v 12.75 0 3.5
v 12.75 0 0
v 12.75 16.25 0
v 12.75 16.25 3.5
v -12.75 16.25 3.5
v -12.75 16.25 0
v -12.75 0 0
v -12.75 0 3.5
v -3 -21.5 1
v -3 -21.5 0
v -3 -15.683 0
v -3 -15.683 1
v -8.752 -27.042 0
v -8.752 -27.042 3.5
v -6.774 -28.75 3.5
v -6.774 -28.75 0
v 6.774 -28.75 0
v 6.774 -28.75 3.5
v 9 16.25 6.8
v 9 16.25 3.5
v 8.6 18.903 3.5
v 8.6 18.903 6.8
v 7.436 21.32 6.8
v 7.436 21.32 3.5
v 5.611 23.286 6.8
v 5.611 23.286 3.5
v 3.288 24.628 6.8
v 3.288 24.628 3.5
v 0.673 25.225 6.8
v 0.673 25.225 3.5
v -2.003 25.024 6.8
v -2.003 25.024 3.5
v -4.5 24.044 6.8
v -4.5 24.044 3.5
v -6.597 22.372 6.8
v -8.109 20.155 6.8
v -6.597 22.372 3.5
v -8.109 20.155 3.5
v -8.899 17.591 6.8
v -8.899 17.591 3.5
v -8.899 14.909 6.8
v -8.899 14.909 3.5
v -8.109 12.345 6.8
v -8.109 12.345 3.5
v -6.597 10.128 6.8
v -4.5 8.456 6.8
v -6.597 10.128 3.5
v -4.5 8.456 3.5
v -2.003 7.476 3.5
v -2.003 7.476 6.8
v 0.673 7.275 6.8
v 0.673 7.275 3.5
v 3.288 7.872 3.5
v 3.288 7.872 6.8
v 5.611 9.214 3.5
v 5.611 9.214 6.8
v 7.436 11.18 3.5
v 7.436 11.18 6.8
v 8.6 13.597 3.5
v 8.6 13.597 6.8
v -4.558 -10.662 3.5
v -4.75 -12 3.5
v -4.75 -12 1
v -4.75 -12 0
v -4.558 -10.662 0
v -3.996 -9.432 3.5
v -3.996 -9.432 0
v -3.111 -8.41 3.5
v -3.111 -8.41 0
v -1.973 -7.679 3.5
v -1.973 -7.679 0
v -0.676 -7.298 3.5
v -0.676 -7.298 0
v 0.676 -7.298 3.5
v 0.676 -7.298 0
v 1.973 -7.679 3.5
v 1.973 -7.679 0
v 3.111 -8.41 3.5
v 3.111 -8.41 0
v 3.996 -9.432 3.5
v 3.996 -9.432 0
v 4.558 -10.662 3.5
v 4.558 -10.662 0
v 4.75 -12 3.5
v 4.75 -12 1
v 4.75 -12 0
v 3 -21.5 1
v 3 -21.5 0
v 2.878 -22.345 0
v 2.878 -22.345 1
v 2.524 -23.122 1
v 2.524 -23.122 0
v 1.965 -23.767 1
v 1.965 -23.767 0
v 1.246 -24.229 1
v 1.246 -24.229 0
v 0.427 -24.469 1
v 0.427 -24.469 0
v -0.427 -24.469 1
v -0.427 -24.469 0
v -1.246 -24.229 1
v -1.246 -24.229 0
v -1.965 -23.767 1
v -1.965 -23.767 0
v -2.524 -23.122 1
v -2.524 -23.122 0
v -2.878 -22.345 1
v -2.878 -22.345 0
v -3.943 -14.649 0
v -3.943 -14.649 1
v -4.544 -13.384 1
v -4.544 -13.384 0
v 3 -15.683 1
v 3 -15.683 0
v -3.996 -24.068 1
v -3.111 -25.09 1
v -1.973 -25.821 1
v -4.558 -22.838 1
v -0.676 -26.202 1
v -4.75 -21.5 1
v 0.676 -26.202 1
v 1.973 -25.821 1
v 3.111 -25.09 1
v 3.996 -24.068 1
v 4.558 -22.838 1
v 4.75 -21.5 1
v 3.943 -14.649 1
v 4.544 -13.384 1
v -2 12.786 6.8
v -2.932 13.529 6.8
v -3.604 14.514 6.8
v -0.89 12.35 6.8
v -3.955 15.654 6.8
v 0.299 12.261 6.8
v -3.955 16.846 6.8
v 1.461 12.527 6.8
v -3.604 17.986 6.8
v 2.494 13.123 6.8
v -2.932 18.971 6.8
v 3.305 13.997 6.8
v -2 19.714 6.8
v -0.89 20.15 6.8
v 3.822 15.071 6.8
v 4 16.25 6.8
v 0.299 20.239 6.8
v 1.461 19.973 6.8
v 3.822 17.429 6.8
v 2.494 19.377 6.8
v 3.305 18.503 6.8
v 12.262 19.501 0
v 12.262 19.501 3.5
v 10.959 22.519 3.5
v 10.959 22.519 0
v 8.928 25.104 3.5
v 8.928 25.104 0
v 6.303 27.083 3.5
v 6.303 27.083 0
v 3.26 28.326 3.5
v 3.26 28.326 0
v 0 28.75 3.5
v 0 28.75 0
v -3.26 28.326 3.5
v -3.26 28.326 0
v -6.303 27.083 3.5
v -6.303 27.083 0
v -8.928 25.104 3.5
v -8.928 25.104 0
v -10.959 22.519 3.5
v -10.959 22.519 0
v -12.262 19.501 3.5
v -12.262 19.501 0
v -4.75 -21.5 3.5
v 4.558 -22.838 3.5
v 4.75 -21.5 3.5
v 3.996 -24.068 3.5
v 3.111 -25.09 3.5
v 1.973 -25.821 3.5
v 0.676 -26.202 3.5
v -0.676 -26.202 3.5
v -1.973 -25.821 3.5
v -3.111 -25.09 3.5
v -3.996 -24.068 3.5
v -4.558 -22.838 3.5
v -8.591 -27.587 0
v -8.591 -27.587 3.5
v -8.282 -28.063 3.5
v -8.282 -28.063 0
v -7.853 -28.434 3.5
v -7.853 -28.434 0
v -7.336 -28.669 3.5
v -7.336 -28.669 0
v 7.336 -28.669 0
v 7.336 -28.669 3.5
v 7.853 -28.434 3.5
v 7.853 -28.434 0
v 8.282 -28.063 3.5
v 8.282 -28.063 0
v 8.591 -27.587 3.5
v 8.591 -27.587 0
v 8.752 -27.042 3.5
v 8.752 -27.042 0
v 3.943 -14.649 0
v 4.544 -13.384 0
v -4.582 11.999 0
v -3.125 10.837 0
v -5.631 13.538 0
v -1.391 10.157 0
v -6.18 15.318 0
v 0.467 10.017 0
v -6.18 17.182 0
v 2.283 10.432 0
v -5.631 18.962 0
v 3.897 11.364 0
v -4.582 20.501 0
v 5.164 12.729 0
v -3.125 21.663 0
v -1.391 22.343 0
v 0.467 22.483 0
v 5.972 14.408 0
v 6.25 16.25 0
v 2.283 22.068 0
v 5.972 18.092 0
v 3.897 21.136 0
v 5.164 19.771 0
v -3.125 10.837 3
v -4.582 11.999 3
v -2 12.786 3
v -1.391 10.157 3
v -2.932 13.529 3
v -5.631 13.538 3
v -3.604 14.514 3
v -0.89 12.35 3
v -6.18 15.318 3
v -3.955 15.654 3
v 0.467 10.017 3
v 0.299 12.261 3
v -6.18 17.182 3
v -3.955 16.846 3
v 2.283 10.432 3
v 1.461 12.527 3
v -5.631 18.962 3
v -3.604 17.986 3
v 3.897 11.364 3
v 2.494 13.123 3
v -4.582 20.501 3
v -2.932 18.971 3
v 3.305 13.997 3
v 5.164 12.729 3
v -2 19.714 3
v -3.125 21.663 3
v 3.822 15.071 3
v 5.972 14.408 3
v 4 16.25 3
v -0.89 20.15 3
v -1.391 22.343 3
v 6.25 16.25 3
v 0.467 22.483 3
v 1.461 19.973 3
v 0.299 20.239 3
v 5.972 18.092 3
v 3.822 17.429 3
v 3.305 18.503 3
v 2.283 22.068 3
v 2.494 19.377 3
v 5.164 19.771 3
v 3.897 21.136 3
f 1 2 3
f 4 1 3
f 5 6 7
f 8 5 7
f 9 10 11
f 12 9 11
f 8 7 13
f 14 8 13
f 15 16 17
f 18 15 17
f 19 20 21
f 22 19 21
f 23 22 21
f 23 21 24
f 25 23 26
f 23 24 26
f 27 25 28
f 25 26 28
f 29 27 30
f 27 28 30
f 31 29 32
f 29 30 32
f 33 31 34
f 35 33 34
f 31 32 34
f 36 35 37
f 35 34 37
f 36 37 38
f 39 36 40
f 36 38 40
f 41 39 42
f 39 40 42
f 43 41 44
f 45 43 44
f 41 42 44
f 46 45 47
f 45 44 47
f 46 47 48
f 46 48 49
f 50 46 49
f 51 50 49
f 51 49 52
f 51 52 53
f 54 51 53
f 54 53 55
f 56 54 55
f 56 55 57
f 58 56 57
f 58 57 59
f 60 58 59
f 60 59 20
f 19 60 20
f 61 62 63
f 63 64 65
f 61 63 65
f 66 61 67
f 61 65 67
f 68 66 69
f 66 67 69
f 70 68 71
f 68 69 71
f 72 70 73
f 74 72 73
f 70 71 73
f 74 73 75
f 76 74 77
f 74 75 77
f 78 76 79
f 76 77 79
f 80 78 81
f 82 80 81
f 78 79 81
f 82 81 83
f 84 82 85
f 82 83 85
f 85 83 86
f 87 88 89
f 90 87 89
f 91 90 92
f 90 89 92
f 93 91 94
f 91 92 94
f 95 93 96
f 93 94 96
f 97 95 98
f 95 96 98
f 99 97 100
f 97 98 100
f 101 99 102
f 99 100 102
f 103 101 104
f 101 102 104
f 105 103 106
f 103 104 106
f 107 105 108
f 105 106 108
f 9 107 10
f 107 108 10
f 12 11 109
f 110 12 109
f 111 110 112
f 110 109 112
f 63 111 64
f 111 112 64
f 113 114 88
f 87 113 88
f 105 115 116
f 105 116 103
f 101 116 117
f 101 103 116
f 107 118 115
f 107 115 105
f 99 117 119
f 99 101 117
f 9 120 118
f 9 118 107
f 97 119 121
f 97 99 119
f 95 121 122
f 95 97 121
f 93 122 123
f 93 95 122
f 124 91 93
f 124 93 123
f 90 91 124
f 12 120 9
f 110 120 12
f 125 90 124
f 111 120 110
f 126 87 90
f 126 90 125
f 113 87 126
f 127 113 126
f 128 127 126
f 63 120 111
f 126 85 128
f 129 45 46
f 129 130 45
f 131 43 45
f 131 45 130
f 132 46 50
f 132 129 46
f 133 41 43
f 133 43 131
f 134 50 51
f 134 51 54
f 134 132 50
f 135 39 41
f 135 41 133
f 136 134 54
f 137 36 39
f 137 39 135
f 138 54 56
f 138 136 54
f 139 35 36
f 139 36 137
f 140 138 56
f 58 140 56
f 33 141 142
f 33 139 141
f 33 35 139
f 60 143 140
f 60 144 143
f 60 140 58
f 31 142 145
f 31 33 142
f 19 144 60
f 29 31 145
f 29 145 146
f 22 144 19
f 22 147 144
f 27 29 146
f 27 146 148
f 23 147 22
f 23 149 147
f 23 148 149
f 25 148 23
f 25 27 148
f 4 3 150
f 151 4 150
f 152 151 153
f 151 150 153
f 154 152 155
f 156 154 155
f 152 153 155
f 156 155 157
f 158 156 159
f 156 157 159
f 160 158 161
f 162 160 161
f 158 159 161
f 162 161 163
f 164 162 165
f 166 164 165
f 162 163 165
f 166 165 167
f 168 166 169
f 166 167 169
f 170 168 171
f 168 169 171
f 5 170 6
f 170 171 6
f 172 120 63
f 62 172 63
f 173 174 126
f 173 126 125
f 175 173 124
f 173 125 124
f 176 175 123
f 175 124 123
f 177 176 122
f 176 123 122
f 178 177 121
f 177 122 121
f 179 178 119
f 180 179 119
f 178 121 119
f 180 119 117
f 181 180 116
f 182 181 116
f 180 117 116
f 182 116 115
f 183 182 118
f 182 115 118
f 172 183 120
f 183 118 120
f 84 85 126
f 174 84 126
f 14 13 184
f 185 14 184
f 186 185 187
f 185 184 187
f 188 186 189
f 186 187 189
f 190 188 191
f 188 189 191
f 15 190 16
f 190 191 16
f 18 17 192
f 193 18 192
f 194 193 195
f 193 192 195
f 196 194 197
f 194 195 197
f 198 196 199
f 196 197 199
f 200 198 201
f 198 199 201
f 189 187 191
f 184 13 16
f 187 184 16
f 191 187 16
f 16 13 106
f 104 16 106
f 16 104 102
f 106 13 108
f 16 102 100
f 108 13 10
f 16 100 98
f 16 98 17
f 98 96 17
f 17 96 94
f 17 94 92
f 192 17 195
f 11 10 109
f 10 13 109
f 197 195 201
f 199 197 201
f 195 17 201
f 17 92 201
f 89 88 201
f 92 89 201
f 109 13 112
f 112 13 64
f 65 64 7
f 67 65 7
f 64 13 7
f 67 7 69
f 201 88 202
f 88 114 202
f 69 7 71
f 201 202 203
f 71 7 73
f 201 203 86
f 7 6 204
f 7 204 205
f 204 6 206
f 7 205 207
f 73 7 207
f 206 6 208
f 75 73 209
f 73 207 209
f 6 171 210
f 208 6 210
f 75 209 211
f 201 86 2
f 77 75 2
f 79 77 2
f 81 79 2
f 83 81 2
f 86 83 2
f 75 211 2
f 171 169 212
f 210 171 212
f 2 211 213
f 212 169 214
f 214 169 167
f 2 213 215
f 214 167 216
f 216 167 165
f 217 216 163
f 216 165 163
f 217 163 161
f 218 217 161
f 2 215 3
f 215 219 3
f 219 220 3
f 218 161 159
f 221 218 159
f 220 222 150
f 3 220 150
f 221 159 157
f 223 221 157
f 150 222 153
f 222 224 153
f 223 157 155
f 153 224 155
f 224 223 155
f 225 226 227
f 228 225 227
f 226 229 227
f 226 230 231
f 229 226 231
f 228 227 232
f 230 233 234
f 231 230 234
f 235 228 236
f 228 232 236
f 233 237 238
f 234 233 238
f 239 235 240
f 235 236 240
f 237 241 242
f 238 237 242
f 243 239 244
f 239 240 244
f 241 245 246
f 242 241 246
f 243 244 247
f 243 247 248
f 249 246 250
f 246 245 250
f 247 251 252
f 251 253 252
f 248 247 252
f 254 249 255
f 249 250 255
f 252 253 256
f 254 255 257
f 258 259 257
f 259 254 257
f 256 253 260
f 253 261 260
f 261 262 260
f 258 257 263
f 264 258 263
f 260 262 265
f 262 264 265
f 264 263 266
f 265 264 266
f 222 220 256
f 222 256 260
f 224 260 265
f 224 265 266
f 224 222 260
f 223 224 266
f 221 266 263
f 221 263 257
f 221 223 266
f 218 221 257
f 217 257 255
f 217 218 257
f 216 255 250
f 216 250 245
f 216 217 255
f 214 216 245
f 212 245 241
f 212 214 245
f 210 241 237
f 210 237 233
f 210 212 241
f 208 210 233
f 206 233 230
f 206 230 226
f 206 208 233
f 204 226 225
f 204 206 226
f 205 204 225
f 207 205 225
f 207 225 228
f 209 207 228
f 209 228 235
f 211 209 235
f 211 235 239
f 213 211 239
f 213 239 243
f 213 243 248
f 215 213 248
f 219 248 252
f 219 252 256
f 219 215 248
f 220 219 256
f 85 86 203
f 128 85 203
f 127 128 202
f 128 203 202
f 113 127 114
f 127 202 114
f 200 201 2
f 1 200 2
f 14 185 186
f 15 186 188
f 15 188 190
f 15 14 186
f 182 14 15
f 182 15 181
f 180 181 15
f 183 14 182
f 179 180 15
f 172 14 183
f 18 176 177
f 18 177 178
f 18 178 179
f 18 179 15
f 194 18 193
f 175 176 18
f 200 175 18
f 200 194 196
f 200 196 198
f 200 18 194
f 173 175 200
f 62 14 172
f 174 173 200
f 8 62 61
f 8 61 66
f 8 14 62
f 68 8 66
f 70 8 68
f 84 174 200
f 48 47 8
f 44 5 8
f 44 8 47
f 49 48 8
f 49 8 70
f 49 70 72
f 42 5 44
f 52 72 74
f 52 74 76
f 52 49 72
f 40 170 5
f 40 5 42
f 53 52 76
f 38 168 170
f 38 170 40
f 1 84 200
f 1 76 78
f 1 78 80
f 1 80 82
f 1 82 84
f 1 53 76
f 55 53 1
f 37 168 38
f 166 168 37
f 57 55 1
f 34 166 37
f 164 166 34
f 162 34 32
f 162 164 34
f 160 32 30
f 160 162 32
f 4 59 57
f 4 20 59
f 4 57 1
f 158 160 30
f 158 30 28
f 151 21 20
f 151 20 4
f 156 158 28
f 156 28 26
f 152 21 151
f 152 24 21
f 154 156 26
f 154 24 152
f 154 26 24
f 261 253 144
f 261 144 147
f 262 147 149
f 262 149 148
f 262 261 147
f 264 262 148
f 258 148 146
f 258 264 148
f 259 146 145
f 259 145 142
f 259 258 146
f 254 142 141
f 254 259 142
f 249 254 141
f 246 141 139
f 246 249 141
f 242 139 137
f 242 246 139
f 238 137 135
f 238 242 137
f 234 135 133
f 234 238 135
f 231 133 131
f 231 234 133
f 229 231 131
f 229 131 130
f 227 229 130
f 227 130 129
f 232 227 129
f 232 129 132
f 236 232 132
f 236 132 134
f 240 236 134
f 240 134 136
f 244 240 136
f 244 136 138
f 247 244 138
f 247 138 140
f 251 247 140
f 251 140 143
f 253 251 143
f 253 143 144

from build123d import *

# Parameters (mm, degrees)
F0_R     = 9
F1_DEPTH = 3.5
F2_DEPTH = 1
F0_R_2   = 6.25
F0_R_3   = 4
F3_DEPTH = 6.8
F4_DEPTH = 3


with BuildPart() as f1:
    # F0 (on Top) → F1 (new body)
    with BuildSketch(Plane.XY):
        with BuildLine():
            ThreePointArc((-8.752417, -27.042474), (-8.080641, -28.264092), (-6.773918, -28.75))
            Line((-6.773918, -28.75), (6.773918, -28.75))
            ThreePointArc((6.773918, -28.75), (8.080641, -28.264092), (8.752417, -27.042474))
            Line((8.752417, -27.042474), (12.75, 0))
            Line((12.75, 0), (12.75, 16.25))
            ThreePointArc((12.75, 16.25), (0, 28.75), (-12.75, 16.25))
            Line((-12.75, 16.25), (-12.75, 0))
            Line((-12.75, 0), (-8.752417, -27.042474))
        make_face()
        with BuildLine():
            Line((-4.75, -21.5), (-4.75, -12))
            ThreePointArc((-4.75, -12), (0, -7.25), (4.75, -12))
            Line((4.75, -12), (4.75, -21.5))
            ThreePointArc((4.75, -21.5), (0, -26.25), (-4.75, -21.5))
        make_face(mode=Mode.SUBTRACT)
        with Locations((0, 16.25)):
            Circle(F0_R, mode=Mode.SUBTRACT)
    extrude(amount=F1_DEPTH)

    # F0 (on Top) → F2 (join)
    with BuildSketch(Plane.XY):
        with BuildLine():
            ThreePointArc((-3, -15.68273), (-4.290251, -14.038688), (-4.75, -12))
            Line((-4.75, -12), (-4.75, -21.5))
            ThreePointArc((-4.75, -21.5), (0, -26.25), (4.75, -21.5))
            Line((4.75, -21.5), (4.75, -12))
            ThreePointArc((4.75, -12), (4.290251, -14.038688), (3, -15.68273))
            Line((3, -15.68273), (3, -21.5))
            ThreePointArc((3, -21.5), (0, -24.5), (-3, -21.5))
            Line((-3, -21.5), (-3, -15.68273))
        make_face()
    extrude(amount=F2_DEPTH)

    # F0 (on Top) → F3 (join)
    with BuildSketch(Plane.XY):
        with Locations((0, 16.25)):
            Circle(F0_R)
        with Locations((0, 16.25)):
            Circle(F0_R_2, mode=Mode.SUBTRACT)
        with Locations((0, 16.25)):
            Circle(F0_R_2)
        with Locations((0, 16.25)):
            Circle(F0_R_3, mode=Mode.SUBTRACT)
    extrude(amount=F3_DEPTH)

    # F0 (on Top) → F4 (cut)
    with BuildSketch(Plane.XY):
        with Locations((0, 16.25)):
            Circle(F0_R_2)
        with Locations((0, 16.25)):
            Circle(F0_R_3, mode=Mode.SUBTRACT)
    extrude(amount=F4_DEPTH, mode=Mode.SUBTRACT)


solid = f1.part
